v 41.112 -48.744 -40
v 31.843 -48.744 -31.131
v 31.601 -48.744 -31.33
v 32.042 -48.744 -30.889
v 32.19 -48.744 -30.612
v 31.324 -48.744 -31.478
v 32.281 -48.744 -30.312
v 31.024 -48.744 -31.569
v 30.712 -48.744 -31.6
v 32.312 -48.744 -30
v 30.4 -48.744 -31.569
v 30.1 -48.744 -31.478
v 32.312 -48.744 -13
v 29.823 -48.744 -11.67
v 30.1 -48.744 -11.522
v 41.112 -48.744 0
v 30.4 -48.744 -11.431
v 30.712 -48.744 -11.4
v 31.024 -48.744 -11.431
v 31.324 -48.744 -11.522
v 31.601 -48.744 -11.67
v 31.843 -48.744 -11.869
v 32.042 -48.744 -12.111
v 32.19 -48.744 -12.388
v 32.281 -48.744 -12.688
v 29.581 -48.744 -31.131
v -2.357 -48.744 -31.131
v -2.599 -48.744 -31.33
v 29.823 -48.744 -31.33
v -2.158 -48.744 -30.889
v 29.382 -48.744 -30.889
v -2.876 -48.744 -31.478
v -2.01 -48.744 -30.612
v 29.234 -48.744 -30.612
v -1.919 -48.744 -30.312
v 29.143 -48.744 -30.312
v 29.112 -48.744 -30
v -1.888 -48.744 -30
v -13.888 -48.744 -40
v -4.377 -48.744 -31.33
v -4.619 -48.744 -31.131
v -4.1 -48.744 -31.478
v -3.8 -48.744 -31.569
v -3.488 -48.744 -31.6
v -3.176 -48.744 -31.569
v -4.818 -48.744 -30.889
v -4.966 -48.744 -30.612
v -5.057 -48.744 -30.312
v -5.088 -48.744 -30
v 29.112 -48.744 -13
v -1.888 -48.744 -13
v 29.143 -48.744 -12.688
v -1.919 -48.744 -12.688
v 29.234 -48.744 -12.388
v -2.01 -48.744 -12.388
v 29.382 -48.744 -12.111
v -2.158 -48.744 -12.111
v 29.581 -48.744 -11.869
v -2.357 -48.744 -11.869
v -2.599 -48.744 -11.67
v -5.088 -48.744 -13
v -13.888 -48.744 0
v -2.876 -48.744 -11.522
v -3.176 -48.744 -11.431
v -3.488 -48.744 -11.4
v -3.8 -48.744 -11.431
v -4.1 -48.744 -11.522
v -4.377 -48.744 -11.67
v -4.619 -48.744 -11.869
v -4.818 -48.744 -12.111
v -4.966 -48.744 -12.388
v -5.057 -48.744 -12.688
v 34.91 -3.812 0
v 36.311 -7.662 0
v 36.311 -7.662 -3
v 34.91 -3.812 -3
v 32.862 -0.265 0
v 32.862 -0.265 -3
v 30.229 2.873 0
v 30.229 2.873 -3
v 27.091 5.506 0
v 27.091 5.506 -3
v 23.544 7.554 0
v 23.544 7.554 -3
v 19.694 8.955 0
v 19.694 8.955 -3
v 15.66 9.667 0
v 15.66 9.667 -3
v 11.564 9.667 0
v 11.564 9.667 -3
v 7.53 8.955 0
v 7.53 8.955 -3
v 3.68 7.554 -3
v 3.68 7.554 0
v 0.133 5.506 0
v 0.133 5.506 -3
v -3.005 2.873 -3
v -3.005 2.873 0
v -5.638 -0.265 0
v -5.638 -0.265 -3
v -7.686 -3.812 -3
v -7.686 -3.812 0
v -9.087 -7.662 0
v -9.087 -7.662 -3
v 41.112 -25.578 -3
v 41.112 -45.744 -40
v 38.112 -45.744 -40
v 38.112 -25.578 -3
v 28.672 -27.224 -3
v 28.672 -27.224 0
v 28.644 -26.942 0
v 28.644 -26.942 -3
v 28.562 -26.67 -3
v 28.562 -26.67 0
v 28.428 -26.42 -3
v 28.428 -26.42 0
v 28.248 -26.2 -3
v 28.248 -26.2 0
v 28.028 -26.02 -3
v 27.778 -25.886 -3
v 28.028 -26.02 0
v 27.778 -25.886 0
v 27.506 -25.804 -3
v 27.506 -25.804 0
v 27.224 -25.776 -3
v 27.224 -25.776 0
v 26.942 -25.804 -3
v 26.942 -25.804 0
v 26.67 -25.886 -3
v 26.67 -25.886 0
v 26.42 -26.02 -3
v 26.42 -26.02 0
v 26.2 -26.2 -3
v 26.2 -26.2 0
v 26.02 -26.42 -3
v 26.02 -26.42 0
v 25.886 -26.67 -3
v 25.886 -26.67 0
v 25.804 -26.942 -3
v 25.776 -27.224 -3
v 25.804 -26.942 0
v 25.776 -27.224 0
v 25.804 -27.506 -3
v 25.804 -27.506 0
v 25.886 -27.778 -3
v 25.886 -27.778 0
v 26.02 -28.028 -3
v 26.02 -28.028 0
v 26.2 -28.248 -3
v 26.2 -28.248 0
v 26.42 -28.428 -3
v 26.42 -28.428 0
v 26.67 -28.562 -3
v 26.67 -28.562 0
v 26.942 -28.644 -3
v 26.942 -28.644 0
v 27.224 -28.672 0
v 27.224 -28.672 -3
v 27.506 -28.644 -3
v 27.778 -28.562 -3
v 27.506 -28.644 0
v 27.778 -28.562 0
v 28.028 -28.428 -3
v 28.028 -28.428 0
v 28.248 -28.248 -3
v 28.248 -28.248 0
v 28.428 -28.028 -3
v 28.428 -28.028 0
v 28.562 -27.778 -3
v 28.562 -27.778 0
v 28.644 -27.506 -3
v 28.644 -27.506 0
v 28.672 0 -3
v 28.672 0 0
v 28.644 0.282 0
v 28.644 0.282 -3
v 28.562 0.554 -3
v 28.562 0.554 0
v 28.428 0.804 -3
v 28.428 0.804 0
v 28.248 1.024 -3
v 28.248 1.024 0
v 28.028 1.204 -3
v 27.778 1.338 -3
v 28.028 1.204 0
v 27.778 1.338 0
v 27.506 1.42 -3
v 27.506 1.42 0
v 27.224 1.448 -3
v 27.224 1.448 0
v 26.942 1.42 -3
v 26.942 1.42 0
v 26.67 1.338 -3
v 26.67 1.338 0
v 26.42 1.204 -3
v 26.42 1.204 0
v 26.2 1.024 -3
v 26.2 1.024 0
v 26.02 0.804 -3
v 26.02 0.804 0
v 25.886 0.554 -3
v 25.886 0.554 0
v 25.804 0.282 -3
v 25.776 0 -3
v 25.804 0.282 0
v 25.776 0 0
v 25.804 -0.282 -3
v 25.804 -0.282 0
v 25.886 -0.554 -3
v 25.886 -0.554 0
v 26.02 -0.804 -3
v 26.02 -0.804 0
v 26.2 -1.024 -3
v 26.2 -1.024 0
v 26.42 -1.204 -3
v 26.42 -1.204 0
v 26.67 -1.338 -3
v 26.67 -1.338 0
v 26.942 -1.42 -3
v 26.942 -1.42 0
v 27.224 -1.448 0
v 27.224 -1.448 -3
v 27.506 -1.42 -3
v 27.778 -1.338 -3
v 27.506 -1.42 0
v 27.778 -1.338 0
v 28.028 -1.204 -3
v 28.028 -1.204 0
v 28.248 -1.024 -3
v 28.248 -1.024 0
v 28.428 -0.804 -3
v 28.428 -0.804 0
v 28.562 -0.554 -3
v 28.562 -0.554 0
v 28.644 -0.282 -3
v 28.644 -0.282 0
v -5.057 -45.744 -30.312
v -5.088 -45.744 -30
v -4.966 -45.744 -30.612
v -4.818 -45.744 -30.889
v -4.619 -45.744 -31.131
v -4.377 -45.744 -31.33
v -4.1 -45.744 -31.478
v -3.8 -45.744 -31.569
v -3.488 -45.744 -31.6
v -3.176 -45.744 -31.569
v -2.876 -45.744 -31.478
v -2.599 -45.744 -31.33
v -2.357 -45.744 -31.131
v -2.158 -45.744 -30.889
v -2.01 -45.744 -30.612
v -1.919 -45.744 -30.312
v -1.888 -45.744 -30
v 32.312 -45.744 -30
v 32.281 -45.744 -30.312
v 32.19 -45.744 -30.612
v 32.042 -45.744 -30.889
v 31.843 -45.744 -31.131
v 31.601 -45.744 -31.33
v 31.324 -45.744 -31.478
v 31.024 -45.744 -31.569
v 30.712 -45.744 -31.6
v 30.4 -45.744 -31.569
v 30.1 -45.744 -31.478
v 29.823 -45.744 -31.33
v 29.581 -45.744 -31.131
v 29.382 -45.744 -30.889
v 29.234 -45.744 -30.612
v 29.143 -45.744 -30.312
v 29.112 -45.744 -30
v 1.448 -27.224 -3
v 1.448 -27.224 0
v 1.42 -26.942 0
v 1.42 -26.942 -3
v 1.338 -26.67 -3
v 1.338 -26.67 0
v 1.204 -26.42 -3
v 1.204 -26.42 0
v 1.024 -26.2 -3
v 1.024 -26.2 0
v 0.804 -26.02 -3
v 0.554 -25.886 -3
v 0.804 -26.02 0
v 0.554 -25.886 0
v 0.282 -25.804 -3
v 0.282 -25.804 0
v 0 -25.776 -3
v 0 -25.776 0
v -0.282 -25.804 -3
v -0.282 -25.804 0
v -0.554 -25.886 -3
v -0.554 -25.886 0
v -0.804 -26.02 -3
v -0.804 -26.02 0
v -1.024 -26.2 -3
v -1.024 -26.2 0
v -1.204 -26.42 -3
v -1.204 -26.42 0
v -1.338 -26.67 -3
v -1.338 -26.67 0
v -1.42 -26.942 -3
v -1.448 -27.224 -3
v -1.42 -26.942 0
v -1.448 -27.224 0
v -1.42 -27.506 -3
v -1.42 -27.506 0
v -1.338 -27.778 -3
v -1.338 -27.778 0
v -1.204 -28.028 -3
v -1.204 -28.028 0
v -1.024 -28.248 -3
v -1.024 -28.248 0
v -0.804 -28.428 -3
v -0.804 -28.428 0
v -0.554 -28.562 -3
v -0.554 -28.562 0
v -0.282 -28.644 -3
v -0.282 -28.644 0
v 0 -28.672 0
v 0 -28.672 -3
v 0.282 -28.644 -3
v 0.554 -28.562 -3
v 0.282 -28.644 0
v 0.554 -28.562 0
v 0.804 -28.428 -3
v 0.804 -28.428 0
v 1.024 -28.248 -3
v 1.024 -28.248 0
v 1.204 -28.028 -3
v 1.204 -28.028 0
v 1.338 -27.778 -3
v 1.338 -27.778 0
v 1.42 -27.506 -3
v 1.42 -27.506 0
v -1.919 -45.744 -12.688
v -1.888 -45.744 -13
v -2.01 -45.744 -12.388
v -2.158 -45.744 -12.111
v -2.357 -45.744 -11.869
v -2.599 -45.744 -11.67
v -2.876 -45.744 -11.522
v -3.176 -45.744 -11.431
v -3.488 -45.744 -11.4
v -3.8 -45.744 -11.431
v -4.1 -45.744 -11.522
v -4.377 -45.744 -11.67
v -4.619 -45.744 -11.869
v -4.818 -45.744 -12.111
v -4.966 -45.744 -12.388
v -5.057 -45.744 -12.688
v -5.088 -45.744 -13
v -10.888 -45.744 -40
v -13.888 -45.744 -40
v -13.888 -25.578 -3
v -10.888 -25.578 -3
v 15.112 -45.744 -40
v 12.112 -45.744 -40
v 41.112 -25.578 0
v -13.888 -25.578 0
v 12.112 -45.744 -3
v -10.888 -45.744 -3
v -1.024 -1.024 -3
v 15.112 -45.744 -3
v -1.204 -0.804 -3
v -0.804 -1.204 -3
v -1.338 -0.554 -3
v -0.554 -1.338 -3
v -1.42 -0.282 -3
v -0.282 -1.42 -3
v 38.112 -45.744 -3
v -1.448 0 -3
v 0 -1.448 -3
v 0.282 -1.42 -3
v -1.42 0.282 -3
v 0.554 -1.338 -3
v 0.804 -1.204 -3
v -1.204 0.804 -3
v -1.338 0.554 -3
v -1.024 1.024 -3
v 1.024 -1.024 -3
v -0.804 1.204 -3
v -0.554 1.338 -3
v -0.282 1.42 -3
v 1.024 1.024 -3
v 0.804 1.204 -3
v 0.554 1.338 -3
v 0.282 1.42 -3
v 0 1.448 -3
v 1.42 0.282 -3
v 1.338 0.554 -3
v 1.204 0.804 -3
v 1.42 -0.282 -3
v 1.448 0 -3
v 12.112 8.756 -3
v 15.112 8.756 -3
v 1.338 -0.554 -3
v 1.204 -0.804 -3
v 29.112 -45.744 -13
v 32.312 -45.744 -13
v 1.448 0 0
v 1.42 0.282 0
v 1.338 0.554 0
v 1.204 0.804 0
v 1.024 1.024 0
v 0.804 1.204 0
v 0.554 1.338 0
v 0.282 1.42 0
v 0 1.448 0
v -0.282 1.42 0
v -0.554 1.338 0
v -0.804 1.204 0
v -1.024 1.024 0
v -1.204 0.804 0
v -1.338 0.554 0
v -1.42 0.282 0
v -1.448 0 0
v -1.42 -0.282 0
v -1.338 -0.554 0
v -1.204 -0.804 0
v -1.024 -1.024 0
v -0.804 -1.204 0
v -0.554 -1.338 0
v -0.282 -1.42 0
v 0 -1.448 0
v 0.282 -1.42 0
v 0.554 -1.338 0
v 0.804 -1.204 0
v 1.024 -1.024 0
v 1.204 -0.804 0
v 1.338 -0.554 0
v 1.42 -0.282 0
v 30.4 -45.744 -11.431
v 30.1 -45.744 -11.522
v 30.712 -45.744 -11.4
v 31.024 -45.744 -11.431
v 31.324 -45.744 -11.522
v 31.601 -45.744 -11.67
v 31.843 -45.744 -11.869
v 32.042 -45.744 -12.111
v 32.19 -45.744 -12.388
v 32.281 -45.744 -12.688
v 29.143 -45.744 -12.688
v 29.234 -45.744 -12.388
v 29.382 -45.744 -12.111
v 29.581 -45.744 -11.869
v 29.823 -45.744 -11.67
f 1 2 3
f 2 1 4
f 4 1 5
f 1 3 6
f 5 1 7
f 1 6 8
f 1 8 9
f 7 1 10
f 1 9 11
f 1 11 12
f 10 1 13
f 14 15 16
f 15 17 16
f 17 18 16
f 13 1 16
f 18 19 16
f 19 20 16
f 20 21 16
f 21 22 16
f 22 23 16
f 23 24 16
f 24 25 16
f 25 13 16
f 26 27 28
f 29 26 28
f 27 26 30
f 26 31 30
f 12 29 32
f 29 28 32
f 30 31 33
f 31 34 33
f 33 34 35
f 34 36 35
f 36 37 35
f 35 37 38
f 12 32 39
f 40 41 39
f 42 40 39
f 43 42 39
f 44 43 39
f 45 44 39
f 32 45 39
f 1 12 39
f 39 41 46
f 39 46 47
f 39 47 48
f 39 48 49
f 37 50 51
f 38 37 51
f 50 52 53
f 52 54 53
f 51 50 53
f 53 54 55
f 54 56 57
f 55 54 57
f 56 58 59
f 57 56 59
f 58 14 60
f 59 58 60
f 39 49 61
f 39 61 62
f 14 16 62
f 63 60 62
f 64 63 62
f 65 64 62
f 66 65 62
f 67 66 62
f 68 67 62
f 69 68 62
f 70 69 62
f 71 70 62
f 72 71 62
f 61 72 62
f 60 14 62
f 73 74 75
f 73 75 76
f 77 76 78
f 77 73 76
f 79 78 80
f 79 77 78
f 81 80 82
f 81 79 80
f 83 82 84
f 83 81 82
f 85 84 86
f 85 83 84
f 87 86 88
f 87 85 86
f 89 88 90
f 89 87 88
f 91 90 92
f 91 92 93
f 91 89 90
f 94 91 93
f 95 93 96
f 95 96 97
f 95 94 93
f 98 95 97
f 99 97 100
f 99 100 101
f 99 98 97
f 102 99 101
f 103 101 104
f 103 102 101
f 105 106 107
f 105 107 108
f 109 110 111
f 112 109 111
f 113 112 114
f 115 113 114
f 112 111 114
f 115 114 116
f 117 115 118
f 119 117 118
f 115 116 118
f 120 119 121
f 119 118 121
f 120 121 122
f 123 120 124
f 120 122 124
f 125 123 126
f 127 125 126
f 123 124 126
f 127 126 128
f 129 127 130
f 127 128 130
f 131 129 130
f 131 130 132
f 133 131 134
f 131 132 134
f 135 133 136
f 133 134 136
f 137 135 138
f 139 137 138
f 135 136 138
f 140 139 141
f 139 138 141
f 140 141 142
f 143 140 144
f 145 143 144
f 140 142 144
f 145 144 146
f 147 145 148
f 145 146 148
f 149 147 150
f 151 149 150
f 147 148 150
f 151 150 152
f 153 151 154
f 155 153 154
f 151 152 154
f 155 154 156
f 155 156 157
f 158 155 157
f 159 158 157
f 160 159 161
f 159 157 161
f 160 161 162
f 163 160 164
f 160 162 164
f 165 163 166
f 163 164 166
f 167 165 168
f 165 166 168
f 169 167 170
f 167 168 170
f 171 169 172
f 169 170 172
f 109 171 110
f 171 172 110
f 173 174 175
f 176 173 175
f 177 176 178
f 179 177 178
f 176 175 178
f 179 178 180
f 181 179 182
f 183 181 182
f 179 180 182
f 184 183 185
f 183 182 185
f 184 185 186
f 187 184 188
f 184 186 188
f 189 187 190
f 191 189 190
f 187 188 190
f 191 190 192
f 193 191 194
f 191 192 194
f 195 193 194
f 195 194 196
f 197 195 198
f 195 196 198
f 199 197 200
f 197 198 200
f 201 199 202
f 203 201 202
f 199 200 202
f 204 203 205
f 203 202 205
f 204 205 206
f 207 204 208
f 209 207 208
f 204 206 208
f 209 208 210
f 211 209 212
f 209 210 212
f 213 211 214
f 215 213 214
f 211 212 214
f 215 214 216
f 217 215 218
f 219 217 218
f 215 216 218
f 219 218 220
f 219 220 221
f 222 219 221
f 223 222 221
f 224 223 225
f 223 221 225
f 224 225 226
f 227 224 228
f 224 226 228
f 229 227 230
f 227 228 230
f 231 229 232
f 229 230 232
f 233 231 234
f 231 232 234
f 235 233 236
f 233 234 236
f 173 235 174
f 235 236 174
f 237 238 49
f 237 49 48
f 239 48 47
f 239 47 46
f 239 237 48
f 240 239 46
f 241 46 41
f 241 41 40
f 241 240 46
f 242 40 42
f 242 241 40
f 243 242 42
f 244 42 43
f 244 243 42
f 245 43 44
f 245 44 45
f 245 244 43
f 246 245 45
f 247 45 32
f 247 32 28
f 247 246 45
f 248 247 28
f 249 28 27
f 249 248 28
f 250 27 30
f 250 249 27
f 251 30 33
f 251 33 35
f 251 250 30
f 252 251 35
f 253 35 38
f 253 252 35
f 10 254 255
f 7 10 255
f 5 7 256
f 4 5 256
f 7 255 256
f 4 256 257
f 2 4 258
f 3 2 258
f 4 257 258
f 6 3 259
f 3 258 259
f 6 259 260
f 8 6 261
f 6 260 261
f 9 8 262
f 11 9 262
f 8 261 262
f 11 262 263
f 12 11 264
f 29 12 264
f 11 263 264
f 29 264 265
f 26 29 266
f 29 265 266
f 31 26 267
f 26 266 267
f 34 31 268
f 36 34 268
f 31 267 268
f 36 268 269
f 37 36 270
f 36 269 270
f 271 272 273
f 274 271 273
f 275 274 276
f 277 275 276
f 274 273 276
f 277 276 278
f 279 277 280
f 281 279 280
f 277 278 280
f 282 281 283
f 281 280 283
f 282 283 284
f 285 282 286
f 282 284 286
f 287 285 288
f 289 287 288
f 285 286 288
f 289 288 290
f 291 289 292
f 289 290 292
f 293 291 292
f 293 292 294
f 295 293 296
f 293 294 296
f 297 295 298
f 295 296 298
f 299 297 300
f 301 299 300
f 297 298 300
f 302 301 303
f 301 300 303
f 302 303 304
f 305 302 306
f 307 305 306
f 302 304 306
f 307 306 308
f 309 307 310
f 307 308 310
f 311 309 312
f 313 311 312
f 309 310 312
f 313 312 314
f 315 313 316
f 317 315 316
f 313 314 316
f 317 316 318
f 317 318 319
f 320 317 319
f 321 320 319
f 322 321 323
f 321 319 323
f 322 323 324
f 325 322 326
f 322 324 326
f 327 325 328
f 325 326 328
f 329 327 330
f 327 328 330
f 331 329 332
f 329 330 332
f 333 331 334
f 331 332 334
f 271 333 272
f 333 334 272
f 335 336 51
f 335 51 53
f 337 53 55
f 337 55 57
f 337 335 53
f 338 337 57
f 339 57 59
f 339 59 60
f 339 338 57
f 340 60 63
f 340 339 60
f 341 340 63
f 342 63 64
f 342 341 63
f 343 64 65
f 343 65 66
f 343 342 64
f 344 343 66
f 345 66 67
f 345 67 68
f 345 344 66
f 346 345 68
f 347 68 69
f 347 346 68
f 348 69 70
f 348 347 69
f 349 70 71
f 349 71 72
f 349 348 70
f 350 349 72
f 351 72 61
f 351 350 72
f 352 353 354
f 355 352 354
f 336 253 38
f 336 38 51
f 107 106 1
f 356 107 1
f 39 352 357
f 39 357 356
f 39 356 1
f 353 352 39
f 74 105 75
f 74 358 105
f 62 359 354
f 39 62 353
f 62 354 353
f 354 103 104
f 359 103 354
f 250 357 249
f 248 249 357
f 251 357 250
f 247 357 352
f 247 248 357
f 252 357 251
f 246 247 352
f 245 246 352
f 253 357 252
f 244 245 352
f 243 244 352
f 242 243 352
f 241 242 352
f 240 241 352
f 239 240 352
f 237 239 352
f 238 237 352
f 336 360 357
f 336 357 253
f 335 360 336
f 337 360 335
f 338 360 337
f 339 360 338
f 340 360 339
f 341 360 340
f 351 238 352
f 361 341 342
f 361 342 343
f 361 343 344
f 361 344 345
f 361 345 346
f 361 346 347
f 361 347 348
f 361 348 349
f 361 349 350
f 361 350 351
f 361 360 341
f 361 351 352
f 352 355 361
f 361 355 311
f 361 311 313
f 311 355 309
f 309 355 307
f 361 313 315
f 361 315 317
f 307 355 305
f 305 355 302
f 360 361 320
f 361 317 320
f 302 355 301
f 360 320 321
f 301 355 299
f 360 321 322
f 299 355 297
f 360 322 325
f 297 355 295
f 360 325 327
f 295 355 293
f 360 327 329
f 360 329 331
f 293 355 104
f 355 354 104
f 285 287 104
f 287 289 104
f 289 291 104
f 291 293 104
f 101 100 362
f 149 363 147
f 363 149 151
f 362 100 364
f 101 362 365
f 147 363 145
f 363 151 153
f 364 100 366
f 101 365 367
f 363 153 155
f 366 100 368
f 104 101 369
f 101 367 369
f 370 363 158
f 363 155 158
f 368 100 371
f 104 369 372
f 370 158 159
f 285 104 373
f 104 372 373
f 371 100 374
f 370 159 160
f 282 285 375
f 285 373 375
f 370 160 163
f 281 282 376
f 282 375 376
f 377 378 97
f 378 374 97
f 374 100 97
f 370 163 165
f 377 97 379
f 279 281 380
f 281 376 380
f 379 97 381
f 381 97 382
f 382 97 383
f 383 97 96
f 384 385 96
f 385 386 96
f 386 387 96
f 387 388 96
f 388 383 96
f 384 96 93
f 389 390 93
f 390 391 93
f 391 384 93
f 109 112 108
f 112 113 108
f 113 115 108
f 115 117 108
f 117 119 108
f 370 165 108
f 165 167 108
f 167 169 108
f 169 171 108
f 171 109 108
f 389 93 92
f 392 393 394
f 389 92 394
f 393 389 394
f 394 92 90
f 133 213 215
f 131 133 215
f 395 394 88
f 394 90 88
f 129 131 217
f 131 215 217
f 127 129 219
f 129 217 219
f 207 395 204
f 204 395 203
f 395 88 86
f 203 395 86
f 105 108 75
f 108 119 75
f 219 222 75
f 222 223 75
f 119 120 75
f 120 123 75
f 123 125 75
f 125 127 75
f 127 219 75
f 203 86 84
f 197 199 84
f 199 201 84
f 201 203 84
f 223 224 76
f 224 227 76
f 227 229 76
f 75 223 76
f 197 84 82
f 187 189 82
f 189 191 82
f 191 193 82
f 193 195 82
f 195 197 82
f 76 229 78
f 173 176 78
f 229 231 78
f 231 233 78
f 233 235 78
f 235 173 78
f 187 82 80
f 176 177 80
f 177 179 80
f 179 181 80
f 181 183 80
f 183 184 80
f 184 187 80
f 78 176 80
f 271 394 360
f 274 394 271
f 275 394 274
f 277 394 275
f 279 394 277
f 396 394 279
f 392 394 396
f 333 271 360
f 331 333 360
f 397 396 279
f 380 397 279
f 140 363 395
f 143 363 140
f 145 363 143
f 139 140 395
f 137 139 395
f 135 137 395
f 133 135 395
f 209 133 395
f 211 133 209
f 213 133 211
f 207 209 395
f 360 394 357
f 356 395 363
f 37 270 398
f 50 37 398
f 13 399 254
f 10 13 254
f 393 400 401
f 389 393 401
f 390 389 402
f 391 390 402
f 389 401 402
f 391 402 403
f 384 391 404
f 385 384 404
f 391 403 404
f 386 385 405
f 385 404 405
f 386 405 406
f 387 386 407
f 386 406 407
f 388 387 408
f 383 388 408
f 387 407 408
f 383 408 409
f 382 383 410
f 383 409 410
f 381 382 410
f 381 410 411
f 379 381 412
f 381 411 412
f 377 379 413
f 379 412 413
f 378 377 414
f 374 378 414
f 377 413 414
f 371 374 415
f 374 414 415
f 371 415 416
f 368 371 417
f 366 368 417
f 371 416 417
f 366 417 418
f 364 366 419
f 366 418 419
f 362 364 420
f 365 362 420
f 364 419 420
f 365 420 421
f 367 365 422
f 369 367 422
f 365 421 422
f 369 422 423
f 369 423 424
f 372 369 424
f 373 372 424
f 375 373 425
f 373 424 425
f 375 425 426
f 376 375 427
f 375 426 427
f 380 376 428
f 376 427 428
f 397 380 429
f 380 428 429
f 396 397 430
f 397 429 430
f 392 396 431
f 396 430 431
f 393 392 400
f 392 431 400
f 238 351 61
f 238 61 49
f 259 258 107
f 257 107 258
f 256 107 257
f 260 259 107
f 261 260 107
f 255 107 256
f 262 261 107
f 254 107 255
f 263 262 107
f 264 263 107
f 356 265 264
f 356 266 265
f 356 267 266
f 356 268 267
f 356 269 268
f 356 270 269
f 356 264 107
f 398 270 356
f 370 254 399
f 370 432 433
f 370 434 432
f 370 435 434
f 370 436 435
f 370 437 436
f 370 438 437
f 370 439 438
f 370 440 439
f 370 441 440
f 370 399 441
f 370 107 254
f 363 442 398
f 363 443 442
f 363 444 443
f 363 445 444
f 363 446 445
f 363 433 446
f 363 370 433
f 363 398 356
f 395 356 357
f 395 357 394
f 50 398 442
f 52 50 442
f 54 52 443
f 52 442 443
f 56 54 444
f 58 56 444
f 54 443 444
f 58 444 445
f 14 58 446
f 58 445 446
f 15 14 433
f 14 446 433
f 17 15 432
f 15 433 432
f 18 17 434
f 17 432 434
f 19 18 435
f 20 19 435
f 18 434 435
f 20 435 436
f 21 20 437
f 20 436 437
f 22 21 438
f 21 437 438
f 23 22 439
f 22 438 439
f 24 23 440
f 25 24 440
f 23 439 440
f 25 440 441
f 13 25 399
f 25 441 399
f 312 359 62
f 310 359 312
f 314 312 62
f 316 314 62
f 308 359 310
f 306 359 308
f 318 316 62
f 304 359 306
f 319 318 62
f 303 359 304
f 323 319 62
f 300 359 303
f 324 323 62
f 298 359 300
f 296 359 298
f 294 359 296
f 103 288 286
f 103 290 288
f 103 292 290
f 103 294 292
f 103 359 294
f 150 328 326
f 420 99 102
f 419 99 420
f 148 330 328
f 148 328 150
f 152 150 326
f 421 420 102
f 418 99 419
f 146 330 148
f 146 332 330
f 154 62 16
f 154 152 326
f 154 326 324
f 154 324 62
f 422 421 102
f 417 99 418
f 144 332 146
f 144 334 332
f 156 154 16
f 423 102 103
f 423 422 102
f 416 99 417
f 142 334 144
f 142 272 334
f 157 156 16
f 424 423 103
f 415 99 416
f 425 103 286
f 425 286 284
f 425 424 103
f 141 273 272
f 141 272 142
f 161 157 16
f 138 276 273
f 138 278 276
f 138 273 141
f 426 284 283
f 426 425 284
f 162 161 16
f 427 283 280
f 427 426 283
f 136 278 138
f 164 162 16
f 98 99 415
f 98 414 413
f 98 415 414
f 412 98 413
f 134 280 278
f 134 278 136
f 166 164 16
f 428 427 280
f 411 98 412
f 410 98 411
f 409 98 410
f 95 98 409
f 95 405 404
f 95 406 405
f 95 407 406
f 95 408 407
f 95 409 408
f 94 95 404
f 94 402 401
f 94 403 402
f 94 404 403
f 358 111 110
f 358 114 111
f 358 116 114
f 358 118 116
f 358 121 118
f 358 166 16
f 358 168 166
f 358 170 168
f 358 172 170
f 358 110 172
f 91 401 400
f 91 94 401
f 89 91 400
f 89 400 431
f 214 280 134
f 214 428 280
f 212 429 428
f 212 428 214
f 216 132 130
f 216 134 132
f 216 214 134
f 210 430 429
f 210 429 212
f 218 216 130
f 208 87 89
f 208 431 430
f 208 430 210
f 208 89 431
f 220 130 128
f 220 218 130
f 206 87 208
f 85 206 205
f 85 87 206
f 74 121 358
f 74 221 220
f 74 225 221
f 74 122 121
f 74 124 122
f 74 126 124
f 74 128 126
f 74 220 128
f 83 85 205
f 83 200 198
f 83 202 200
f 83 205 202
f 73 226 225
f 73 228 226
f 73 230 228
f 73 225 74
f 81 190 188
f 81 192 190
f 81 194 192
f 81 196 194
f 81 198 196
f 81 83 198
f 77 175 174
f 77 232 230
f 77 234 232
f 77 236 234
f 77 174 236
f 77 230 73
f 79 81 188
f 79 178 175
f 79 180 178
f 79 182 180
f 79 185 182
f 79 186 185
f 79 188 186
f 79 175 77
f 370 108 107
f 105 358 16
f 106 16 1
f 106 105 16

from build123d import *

# Parameters (mm, degrees)
SKETCH_1_R           = 1.447765
EXTRUDE_1_DEPTH      = 3
SKETCH_2_W           = 54.999996422
SKETCH_2_H           = 3
EXTRUDE_2_DEPTH      = 37
CUT_EXTRUDE_1_DEPTH  = 3
EXTRUDE_3_DEPTH      = 3
EXTRUDE_4_DEPTH      = 1.5
EXTRUDE_4_DEPTH_BACK = 1.5


with BuildPart() as part:
    # 草图1 → 凸台-拉伸1 (new body)
    with BuildSketch(Plane.XY):
        with BuildLine():
            Line((-13.887998211, -25.578349272), (-13.887998211, -48.743989272))
            Line((-13.887998211, -48.743989272), (41.111998211, -48.743989272))
            Line((41.111998211, -48.743989272), (41.111998211, -25.578349272))
            Line((41.111998211, -25.578349272), (36.311256918, -7.661738854))
            ThreePointArc((36.311256918, -7.661738854), (13.612, 9.756013586), (-9.087256918, -7.661738854))
            Line((-9.087256918, -7.661738854), (-13.887998211, -25.578349272))
        make_face()
        Circle(SKETCH_1_R, mode=Mode.SUBTRACT)
        with Locations((27.224, 0)):
            Circle(SKETCH_1_R, mode=Mode.SUBTRACT)
        with Locations((0, -27.224)):
            Circle(SKETCH_1_R, mode=Mode.SUBTRACT)
        with Locations((27.224, -27.224)):
            Circle(SKETCH_1_R, mode=Mode.SUBTRACT)
    extrude(amount=-EXTRUDE_1_DEPTH)

    # 草图2 → 凸台-拉伸2 (add)
    with BuildSketch(Plane(origin=(0, 0, -3), x_dir=(-1, 0, 0), z_dir=(0, 0, -1))):
        with Locations((-13.612, -47.243989272)):
            Rectangle(SKETCH_2_W, SKETCH_2_H)
    extrude(amount=EXTRUDE_2_DEPTH)

    # 草图3 → 切除-拉伸1 (cut)
    with BuildSketch(Plane(origin=(0, -45.743989272, 0), x_dir=(1, 0, 0), z_dir=(0, 1, 0))):
        with BuildLine():
            Line((32.311998211, 13), (32.311998211, 30))
            ThreePointArc((32.311998211, 30), (30.711998211, 31.6), (29.111998211, 30))
            Line((29.111998211, 30), (29.111998211, 13))
            ThreePointArc((29.111998211, 13), (30.711998211, 11.4), (32.311998211, 13))
        make_face()
        with BuildLine():
            Line((-1.887998211, 30), (-1.887998211, 13))
            ThreePointArc((-1.887998211, 13), (-3.487998211, 11.4), (-5.087998211, 13))
            Line((-5.087998211, 13), (-5.087998211, 30))
            ThreePointArc((-5.087998211, 30), (-3.487998211, 31.6), (-1.887998211, 30))
        make_face()
    extrude(amount=-CUT_EXTRUDE_1_DEPTH, mode=Mode.SUBTRACT)

    # 草图4 → 凸台-拉伸3 (add)
    with BuildSketch(Plane(origin=(41.111998211, 0, 0), x_dir=(0, 0, -1), z_dir=(1, 0, 0))):
        Polygon((40, -45.743989272), (3, -25.578345661), (3, -45.743989272), align=None)
    extrude_3 = extrude(amount=-EXTRUDE_3_DEPTH)

    # 草图13 → 凸台-拉伸4 (add, two sides: drawn at the far end of the back side and taken through both)
    with BuildSketch(Plane(origin=(13.612, 0, 0), x_dir=(0, 1, 0), z_dir=(-1, 0, 0)).offset(-EXTRUDE_4_DEPTH_BACK)):
        Polygon((-45.743989272, 40), (8.756018173, 3), (-45.743989272, 3), align=None)
    extrude(amount=EXTRUDE_4_DEPTH + EXTRUDE_4_DEPTH_BACK)

    # 镜向1: 凸台-拉伸3 across plane
    add(extrude_3.mirror(Plane.ZY.offset(-13.612)))


solid = part.part
